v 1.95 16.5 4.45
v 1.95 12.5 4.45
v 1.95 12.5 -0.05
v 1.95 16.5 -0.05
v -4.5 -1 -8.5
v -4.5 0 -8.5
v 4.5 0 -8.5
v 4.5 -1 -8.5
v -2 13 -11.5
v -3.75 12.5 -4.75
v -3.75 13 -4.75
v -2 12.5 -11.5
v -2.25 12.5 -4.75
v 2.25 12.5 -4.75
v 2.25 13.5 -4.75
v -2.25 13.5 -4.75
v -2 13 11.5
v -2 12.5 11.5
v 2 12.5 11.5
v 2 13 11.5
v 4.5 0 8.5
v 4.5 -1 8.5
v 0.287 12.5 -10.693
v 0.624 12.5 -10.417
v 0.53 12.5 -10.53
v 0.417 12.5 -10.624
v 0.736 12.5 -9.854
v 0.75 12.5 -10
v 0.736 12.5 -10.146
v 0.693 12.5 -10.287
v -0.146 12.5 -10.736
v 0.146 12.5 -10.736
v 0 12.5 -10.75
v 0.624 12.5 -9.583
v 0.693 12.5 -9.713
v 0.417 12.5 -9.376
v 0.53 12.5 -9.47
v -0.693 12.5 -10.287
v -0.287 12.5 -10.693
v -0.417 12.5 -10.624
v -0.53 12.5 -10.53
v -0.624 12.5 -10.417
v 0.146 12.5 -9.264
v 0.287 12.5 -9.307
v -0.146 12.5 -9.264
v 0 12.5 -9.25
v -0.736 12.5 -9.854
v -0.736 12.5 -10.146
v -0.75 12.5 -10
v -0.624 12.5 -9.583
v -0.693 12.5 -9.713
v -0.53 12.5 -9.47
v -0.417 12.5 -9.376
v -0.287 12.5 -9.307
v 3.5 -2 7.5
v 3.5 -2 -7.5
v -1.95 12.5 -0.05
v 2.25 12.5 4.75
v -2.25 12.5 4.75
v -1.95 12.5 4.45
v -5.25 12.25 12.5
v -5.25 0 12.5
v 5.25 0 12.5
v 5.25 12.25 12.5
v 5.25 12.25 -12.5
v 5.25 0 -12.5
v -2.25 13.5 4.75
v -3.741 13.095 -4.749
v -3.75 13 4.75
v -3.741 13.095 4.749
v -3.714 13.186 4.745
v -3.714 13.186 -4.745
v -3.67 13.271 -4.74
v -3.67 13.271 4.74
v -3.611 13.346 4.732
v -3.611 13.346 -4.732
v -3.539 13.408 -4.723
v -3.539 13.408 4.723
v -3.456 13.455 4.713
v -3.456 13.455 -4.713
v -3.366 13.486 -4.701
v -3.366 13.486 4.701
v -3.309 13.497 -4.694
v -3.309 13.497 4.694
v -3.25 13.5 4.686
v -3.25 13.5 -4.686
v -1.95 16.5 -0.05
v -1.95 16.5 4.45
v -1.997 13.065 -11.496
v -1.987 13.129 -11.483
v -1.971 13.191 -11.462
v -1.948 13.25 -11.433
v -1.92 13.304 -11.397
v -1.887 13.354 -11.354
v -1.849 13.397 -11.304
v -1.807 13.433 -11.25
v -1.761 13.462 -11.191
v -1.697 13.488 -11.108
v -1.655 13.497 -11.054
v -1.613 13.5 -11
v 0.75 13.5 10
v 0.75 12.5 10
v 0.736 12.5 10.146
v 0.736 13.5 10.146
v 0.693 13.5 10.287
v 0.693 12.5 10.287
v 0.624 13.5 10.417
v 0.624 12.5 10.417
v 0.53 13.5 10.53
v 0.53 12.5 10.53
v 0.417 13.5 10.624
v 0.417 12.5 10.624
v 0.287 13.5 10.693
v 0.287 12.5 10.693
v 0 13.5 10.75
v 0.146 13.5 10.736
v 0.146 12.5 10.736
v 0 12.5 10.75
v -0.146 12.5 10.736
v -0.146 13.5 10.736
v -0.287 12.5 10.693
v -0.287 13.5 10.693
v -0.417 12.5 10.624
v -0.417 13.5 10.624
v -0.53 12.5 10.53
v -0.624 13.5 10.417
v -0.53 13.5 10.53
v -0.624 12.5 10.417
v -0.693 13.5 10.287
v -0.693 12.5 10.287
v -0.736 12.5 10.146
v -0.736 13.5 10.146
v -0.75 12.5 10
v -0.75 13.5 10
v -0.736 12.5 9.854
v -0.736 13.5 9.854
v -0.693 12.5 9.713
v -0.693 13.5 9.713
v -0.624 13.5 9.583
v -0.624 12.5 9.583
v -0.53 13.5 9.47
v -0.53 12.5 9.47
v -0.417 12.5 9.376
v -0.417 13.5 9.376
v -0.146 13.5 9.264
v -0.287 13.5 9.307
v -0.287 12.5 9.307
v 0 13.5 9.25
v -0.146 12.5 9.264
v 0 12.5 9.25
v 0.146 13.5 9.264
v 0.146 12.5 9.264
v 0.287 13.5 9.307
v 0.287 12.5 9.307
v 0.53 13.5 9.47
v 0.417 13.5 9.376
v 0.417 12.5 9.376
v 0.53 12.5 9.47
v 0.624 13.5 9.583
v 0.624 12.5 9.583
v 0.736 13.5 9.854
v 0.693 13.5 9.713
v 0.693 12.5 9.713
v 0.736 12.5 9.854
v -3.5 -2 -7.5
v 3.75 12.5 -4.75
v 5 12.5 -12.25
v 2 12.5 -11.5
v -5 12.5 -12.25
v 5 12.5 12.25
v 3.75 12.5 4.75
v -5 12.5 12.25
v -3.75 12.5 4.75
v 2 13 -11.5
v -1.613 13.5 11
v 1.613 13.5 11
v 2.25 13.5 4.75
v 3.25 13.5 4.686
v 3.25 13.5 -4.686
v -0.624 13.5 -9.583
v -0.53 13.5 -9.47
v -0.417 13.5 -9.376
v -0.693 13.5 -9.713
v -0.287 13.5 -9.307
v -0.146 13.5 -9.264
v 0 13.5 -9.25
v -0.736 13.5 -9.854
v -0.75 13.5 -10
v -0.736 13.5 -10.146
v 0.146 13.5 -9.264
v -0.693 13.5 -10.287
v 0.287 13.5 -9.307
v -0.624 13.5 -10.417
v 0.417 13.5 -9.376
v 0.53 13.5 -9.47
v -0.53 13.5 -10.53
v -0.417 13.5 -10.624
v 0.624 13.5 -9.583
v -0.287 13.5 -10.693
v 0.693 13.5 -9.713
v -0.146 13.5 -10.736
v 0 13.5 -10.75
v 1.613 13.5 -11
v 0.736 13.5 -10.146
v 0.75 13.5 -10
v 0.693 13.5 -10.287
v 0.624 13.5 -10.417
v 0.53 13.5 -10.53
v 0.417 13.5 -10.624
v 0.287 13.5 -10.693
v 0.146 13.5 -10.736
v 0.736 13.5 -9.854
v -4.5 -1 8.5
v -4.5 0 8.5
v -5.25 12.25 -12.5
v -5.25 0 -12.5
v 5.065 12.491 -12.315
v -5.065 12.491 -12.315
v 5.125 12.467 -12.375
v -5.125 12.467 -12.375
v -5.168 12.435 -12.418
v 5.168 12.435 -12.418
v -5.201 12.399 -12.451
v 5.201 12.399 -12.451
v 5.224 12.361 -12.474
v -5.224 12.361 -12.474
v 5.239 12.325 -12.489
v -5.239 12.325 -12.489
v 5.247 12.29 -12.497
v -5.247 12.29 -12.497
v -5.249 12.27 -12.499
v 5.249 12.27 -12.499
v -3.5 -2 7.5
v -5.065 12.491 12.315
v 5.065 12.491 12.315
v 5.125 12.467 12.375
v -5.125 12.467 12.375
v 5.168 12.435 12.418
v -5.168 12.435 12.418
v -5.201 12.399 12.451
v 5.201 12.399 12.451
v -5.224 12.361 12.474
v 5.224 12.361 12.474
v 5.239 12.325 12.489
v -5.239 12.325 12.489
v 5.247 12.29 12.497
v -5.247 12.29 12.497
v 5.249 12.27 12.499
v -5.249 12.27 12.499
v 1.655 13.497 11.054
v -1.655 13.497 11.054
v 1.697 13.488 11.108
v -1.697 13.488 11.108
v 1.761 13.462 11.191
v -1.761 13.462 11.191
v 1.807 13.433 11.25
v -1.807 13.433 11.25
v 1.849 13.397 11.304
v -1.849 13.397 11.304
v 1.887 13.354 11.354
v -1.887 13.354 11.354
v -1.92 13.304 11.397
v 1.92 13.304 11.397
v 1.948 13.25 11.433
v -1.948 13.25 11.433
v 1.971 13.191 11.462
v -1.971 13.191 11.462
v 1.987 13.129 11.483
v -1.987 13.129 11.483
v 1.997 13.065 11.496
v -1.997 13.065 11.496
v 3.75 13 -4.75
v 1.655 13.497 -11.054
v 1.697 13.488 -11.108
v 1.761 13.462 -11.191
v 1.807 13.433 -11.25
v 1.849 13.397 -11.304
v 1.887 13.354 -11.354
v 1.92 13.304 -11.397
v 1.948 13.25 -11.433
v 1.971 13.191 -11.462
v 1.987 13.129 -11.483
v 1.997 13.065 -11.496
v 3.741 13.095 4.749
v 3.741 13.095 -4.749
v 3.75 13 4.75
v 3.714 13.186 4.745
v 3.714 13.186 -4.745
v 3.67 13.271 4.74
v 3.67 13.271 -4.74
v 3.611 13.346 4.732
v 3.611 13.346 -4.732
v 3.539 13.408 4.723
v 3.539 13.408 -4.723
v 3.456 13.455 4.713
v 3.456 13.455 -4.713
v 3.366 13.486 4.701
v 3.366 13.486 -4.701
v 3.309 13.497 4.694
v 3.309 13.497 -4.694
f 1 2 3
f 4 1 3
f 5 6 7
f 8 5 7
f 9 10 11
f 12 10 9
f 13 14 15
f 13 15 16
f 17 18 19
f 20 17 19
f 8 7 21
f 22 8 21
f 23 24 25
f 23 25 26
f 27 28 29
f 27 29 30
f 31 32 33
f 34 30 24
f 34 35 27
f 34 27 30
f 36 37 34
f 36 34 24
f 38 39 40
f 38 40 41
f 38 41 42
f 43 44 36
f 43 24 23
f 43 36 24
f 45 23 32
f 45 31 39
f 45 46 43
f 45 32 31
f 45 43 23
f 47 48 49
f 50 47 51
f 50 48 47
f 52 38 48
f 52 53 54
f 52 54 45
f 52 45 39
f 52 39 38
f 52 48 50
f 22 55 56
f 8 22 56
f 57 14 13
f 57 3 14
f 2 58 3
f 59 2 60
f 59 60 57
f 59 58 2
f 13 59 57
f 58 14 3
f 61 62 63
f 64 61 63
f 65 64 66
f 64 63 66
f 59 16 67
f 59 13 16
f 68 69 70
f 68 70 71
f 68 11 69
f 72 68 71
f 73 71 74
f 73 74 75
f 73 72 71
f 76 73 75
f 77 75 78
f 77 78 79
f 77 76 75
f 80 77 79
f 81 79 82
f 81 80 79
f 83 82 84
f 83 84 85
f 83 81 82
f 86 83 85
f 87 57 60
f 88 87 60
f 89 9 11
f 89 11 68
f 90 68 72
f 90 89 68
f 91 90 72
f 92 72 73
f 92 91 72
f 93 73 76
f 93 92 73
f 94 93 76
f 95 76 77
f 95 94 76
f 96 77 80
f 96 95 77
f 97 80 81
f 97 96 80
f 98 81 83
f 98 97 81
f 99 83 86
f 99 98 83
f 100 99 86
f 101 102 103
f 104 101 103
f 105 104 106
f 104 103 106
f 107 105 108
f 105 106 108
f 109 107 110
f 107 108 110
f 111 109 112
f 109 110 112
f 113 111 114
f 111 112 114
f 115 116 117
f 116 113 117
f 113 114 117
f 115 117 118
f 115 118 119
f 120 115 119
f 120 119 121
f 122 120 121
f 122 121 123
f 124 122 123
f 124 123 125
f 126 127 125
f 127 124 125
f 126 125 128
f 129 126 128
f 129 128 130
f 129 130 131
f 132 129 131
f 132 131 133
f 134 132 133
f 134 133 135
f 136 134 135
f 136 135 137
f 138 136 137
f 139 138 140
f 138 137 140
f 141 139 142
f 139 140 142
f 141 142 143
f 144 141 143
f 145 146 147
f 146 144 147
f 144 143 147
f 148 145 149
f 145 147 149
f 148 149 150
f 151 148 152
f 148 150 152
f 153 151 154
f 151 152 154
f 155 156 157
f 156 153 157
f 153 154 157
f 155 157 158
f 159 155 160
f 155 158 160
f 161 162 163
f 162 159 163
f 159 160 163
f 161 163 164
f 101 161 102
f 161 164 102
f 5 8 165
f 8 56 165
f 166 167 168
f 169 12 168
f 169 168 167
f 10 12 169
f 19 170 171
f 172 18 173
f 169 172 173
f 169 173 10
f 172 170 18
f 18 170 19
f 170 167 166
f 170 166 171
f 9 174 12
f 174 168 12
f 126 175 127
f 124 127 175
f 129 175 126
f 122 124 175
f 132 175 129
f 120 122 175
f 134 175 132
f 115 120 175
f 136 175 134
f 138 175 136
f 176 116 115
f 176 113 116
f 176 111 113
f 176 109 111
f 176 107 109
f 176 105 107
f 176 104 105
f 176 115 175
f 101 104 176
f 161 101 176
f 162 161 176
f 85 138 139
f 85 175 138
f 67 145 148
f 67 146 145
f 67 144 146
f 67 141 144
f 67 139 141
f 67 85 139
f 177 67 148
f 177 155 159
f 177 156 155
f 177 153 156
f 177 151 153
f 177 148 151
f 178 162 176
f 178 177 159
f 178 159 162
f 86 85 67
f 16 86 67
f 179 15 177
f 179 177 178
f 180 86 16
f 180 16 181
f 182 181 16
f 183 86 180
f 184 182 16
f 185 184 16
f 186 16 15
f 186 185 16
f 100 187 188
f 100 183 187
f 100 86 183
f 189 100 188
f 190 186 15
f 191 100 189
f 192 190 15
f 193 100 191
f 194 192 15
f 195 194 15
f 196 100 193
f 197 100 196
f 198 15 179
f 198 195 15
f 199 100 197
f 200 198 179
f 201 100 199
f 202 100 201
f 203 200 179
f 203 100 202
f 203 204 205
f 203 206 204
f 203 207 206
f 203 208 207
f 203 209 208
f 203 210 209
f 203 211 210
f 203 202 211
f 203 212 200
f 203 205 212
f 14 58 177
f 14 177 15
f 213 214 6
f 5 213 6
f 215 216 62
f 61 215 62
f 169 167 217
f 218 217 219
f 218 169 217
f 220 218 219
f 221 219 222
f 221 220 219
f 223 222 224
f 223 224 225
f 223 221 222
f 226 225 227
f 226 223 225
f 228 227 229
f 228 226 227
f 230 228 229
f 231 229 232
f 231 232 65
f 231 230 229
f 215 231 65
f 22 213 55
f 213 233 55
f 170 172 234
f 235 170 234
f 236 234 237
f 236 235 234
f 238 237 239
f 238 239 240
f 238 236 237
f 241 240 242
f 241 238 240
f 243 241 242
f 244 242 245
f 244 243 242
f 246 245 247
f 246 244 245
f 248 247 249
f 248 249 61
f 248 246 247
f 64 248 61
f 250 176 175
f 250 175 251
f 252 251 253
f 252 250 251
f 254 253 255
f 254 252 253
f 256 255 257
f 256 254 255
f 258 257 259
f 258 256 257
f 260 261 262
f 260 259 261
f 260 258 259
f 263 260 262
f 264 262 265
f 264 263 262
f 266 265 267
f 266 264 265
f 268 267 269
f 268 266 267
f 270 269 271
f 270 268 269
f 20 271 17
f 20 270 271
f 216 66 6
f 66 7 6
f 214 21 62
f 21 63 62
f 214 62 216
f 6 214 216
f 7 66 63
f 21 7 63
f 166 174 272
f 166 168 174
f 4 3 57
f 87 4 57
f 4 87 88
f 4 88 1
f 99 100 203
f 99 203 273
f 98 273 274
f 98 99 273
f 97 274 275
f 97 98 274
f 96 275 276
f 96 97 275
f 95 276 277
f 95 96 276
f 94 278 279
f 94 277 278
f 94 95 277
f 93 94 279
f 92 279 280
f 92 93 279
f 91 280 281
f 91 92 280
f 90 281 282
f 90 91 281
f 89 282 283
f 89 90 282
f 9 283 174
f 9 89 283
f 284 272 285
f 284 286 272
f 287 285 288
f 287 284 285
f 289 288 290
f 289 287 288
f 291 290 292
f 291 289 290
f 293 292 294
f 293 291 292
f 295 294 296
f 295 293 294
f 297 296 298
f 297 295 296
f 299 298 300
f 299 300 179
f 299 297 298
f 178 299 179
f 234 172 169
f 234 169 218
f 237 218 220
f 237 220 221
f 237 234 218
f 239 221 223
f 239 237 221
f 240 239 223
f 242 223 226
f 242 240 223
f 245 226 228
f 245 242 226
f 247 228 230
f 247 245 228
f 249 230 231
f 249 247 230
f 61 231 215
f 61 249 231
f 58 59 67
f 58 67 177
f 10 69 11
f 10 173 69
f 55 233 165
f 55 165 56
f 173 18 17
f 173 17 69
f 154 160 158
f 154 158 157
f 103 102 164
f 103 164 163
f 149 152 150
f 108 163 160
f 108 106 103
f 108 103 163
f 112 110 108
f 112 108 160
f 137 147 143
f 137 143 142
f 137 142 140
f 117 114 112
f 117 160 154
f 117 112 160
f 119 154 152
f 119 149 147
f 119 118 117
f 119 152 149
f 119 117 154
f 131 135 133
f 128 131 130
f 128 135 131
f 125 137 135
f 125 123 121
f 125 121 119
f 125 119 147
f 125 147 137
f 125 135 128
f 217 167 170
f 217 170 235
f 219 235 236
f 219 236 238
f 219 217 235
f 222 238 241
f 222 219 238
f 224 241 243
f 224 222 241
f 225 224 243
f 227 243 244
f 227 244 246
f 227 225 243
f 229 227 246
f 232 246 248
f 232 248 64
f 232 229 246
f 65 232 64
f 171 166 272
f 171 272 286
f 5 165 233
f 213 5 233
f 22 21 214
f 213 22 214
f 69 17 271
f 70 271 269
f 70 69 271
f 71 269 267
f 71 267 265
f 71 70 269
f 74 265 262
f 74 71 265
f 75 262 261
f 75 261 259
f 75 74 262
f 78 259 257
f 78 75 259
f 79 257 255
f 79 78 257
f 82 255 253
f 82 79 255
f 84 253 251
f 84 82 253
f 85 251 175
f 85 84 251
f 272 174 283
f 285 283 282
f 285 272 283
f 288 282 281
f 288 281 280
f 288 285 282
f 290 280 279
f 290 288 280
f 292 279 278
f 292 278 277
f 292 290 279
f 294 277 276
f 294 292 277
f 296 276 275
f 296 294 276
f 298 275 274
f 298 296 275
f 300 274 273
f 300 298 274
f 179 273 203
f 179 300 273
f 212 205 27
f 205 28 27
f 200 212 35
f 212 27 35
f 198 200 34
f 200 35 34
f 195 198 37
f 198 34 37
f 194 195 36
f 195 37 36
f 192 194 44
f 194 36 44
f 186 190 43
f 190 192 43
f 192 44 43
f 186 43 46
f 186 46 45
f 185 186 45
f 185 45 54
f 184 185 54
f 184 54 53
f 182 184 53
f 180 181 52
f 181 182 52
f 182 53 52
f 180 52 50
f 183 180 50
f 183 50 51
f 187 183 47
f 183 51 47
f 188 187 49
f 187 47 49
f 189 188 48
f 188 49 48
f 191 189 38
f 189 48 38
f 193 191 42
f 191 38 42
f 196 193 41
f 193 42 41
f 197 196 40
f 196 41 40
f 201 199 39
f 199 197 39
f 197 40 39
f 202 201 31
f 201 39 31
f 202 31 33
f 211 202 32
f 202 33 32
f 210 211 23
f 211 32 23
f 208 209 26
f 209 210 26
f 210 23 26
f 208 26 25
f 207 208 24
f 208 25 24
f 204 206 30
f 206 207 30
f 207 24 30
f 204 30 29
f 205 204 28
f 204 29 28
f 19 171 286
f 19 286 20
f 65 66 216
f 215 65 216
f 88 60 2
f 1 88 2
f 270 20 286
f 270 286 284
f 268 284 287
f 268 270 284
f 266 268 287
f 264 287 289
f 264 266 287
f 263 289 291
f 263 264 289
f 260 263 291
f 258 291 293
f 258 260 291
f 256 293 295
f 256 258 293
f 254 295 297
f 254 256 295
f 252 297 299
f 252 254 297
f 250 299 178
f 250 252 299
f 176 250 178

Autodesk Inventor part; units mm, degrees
ref_plane "YZ Plane" through (0, 0, 0) normal (1, 0, 0) x (0, 1, 0)
ref_plane "XZ Plane" through (0, 0, 0) normal (0, 1, 0) x (-1, 0, 0)
ref_plane "XY Plane" through (0, 0, 0) normal (0, 0, 1) x (1, 0, 0)
sketch "Sketch1" plane through (0, 0, 0) normal (0, 1, 0) x (-1, 0, 0)
  point P0 (0, 0)
sketch "Sketch2" plane through (0, 0, 0) normal (0, 1, 0) x (-1, 0, 0)
  line L0 (5.25, 12.5) -> (-5.25, 12.5)
  line L1 (-5.25, 12.5) -> (-5.25, -12.5)
  line L2 (-5.25, -12.5) -> (5.25, -12.5)
  line L3 (5.25, -12.5) -> (5.25, 12.5)
  point P0 (0, 0)
  dimension "d0" = 10.5
  dimension "d1" = 25
  dimension "d2" = 12.5
  dimension "d3" = 5.25
extrude "Extrusion1" add sketch "Sketch2" along normal blind 12.5
sketch "Sketch3" plane through (0, 12.5, 0) normal (0, 1, 0) x (1, 0, 0)
  line L0 (-2.25, -4.75) -> (2.25, -4.75)
  line L1 (2.25, -4.75) -> (2.25, 4.75)
  line L2 (2.25, 4.75) -> (-2.25, 4.75)
  line L3 (-2.25, 4.75) -> (-2.25, -4.75)
  line L4 (-2.25, -4.75) -> (-3.75, -4.75)
  line L5 (-3.75, -4.75) -> (-3.75, 4.75)
  line L6 (-3.75, 4.75) -> (-2.25, 4.75)
  line L7 (-2.25, 4.75) -> (-2.25, -4.75)
  line L8 (2.25, 4.75) -> (3.75, 4.75)
  line L9 (3.75, 4.75) -> (3.75, -4.75)
  line L10 (3.75, -4.75) -> (2.25, -4.75)
  line L11 (2.25, -4.75) -> (2.25, 4.75)
  circle A0 centre (0, -10) radius 0.75
  circle A1 centre (0, 10) radius 0.75
  line L12 (-5.25, -12.5) -> (5.25, -12.5) projected
  line L13 (5.25, 12.5) -> (-5.25, 12.5) projected
  line L14 (-2, -11.5) -> (2, -11.5)
  line L15 (2, -11.5) -> (2, -8.5)
  line L16 (2, -8.5) -> (-2, -8.5)
  line L17 (-2, -8.5) -> (-2, -11.5)
  line L18 (-2, 8.5) -> (2, 8.5)
  line L19 (2, 8.5) -> (2, 11.5)
  line L20 (2, 11.5) -> (-2, 11.5)
  line L21 (-2, 11.5) -> (-2, 8.5)
  line L22 (-2, -11.5) -> (-3.75, -4.75)
  line L23 (-3.75, 4.75) -> (-2, 11.5)
  line L24 (2, 11.5) -> (3.75, 4.75)
  line L25 (3.75, -4.75) -> (2, -11.5)
  point P0 (0, 0)
  dimension "d6" = 4.5
  dimension "d7" = 9.5
  dimension "d8" = 4.75
  dimension "d9" = 2.25
  dimension "d10" = 1.5
  dimension "d11" = 1.5
  dimension "d12" = 1.5
  dimension "d13" = 1.5
  dimension "d14" = 2.5
  dimension "d15" = 2.5
  dimension "d16" = 4
  dimension "d17" = 3
  dimension "d18" = 4
  dimension "d19" = 3
  dimension "d20" = 1.5
  dimension "d21" = 2
  dimension "d22" = 2
  dimension "d23" = 1.5
extrude "Extrusion2" add sketch "Sketch3" along normal blind 1 contours L4 L5 L6 L3 | L0 L10 L25 L15 L16 L17 L22 L4 | L1 L8 L9 L10 | L6 L23 L21 L18 L19 L24 L8 L2 | L17 L16 L15 L14 | L20 L19 L18 L21
sketch "Sketch4" plane through (0, 12.5, 0) normal (0, 1, 0) x (1, 0, 0)
  line L0 (-1.95, -4.45) -> (1.95, -4.45)
  line L1 (1.95, -4.45) -> (1.95, 0.05)
  line L2 (1.95, 0.05) -> (-1.95, 0.05)
  line L3 (-1.95, 0.05) -> (-1.95, -4.45)
  line L4 (2.25, -4.75) -> (-2.25, -4.75) projected
  line L5 (-2.25, -4.75) -> (-2.25, 4.75) projected
  line L6 (2.25, 4.75) -> (2.25, -4.75) projected
  point P0 (0, 0)
  dimension "d26" = 0.3
  dimension "d27" = 0.3
  dimension "d28" = 0.3
  dimension "d29" = 4.5
extrude "Extrusion3" add sketch "Sketch4" along normal blind 4
sketch "Sketch5" plane through (0, 0, 0) normal (0, -1, 0) x (1, 0, 0)
  line L0 (4.5, 8.5) -> (-4.5, 8.5)
  line L1 (-4.5, 8.5) -> (-4.5, -8.5)
  line L2 (-4.5, -8.5) -> (4.5, -8.5)
  line L3 (4.5, -8.5) -> (4.5, 8.5)
  point P0 (0, 0)
  dimension "d32" = 9
  dimension "d33" = 17
  dimension "d34" = 8.5
  dimension "d35" = 4.5
extrude "Extrusion4" add sketch "Sketch5" along normal blind 2
chamfer "Chamfer1" distance 1 angle 45 4 edges at (0, -2, 8.5) (4.5, -2, 0) (0, -2, -8.5) (-4.5, -2, 0)
fillet "Fillet1" radius 0.5 8 edges at (0, 13.5, 11.5) (-2.875, 13.5, 8.125) (2.875, 13.5, 8.125) (-3.75, 13.5, 0) (-2.875, 13.5, -8.125) (0, 13.5, -11.5) (2.875, 13.5, -8.125) (3.75, 13.5, 0)
fillet "Fillet2" radius 0.25 4 edges at (-5.25, 12.5, 0) (0, 12.5, 12.5) (5.25, 12.5, 0) (0, 12.5, -12.5)
equation "\"d2\" = 0.5 * d1"
equation "\"d3\" = 0.5 * d0"
equation "\"d8\" = 0.5 * d7"
equation "\"d9\" = 0.5 * d6"
equation "\"d20\" = 0.5 * d17"
equation "\"d21\" = 0.5 * d16"
equation "\"d22\" = 0.5 * d18"
equation "\"d23\" = 0.5 * d19"
equation "\"d34\" = 0.5 * d33"
equation "\"d35\" = 0.5 * d32"
properties part number "switch"
